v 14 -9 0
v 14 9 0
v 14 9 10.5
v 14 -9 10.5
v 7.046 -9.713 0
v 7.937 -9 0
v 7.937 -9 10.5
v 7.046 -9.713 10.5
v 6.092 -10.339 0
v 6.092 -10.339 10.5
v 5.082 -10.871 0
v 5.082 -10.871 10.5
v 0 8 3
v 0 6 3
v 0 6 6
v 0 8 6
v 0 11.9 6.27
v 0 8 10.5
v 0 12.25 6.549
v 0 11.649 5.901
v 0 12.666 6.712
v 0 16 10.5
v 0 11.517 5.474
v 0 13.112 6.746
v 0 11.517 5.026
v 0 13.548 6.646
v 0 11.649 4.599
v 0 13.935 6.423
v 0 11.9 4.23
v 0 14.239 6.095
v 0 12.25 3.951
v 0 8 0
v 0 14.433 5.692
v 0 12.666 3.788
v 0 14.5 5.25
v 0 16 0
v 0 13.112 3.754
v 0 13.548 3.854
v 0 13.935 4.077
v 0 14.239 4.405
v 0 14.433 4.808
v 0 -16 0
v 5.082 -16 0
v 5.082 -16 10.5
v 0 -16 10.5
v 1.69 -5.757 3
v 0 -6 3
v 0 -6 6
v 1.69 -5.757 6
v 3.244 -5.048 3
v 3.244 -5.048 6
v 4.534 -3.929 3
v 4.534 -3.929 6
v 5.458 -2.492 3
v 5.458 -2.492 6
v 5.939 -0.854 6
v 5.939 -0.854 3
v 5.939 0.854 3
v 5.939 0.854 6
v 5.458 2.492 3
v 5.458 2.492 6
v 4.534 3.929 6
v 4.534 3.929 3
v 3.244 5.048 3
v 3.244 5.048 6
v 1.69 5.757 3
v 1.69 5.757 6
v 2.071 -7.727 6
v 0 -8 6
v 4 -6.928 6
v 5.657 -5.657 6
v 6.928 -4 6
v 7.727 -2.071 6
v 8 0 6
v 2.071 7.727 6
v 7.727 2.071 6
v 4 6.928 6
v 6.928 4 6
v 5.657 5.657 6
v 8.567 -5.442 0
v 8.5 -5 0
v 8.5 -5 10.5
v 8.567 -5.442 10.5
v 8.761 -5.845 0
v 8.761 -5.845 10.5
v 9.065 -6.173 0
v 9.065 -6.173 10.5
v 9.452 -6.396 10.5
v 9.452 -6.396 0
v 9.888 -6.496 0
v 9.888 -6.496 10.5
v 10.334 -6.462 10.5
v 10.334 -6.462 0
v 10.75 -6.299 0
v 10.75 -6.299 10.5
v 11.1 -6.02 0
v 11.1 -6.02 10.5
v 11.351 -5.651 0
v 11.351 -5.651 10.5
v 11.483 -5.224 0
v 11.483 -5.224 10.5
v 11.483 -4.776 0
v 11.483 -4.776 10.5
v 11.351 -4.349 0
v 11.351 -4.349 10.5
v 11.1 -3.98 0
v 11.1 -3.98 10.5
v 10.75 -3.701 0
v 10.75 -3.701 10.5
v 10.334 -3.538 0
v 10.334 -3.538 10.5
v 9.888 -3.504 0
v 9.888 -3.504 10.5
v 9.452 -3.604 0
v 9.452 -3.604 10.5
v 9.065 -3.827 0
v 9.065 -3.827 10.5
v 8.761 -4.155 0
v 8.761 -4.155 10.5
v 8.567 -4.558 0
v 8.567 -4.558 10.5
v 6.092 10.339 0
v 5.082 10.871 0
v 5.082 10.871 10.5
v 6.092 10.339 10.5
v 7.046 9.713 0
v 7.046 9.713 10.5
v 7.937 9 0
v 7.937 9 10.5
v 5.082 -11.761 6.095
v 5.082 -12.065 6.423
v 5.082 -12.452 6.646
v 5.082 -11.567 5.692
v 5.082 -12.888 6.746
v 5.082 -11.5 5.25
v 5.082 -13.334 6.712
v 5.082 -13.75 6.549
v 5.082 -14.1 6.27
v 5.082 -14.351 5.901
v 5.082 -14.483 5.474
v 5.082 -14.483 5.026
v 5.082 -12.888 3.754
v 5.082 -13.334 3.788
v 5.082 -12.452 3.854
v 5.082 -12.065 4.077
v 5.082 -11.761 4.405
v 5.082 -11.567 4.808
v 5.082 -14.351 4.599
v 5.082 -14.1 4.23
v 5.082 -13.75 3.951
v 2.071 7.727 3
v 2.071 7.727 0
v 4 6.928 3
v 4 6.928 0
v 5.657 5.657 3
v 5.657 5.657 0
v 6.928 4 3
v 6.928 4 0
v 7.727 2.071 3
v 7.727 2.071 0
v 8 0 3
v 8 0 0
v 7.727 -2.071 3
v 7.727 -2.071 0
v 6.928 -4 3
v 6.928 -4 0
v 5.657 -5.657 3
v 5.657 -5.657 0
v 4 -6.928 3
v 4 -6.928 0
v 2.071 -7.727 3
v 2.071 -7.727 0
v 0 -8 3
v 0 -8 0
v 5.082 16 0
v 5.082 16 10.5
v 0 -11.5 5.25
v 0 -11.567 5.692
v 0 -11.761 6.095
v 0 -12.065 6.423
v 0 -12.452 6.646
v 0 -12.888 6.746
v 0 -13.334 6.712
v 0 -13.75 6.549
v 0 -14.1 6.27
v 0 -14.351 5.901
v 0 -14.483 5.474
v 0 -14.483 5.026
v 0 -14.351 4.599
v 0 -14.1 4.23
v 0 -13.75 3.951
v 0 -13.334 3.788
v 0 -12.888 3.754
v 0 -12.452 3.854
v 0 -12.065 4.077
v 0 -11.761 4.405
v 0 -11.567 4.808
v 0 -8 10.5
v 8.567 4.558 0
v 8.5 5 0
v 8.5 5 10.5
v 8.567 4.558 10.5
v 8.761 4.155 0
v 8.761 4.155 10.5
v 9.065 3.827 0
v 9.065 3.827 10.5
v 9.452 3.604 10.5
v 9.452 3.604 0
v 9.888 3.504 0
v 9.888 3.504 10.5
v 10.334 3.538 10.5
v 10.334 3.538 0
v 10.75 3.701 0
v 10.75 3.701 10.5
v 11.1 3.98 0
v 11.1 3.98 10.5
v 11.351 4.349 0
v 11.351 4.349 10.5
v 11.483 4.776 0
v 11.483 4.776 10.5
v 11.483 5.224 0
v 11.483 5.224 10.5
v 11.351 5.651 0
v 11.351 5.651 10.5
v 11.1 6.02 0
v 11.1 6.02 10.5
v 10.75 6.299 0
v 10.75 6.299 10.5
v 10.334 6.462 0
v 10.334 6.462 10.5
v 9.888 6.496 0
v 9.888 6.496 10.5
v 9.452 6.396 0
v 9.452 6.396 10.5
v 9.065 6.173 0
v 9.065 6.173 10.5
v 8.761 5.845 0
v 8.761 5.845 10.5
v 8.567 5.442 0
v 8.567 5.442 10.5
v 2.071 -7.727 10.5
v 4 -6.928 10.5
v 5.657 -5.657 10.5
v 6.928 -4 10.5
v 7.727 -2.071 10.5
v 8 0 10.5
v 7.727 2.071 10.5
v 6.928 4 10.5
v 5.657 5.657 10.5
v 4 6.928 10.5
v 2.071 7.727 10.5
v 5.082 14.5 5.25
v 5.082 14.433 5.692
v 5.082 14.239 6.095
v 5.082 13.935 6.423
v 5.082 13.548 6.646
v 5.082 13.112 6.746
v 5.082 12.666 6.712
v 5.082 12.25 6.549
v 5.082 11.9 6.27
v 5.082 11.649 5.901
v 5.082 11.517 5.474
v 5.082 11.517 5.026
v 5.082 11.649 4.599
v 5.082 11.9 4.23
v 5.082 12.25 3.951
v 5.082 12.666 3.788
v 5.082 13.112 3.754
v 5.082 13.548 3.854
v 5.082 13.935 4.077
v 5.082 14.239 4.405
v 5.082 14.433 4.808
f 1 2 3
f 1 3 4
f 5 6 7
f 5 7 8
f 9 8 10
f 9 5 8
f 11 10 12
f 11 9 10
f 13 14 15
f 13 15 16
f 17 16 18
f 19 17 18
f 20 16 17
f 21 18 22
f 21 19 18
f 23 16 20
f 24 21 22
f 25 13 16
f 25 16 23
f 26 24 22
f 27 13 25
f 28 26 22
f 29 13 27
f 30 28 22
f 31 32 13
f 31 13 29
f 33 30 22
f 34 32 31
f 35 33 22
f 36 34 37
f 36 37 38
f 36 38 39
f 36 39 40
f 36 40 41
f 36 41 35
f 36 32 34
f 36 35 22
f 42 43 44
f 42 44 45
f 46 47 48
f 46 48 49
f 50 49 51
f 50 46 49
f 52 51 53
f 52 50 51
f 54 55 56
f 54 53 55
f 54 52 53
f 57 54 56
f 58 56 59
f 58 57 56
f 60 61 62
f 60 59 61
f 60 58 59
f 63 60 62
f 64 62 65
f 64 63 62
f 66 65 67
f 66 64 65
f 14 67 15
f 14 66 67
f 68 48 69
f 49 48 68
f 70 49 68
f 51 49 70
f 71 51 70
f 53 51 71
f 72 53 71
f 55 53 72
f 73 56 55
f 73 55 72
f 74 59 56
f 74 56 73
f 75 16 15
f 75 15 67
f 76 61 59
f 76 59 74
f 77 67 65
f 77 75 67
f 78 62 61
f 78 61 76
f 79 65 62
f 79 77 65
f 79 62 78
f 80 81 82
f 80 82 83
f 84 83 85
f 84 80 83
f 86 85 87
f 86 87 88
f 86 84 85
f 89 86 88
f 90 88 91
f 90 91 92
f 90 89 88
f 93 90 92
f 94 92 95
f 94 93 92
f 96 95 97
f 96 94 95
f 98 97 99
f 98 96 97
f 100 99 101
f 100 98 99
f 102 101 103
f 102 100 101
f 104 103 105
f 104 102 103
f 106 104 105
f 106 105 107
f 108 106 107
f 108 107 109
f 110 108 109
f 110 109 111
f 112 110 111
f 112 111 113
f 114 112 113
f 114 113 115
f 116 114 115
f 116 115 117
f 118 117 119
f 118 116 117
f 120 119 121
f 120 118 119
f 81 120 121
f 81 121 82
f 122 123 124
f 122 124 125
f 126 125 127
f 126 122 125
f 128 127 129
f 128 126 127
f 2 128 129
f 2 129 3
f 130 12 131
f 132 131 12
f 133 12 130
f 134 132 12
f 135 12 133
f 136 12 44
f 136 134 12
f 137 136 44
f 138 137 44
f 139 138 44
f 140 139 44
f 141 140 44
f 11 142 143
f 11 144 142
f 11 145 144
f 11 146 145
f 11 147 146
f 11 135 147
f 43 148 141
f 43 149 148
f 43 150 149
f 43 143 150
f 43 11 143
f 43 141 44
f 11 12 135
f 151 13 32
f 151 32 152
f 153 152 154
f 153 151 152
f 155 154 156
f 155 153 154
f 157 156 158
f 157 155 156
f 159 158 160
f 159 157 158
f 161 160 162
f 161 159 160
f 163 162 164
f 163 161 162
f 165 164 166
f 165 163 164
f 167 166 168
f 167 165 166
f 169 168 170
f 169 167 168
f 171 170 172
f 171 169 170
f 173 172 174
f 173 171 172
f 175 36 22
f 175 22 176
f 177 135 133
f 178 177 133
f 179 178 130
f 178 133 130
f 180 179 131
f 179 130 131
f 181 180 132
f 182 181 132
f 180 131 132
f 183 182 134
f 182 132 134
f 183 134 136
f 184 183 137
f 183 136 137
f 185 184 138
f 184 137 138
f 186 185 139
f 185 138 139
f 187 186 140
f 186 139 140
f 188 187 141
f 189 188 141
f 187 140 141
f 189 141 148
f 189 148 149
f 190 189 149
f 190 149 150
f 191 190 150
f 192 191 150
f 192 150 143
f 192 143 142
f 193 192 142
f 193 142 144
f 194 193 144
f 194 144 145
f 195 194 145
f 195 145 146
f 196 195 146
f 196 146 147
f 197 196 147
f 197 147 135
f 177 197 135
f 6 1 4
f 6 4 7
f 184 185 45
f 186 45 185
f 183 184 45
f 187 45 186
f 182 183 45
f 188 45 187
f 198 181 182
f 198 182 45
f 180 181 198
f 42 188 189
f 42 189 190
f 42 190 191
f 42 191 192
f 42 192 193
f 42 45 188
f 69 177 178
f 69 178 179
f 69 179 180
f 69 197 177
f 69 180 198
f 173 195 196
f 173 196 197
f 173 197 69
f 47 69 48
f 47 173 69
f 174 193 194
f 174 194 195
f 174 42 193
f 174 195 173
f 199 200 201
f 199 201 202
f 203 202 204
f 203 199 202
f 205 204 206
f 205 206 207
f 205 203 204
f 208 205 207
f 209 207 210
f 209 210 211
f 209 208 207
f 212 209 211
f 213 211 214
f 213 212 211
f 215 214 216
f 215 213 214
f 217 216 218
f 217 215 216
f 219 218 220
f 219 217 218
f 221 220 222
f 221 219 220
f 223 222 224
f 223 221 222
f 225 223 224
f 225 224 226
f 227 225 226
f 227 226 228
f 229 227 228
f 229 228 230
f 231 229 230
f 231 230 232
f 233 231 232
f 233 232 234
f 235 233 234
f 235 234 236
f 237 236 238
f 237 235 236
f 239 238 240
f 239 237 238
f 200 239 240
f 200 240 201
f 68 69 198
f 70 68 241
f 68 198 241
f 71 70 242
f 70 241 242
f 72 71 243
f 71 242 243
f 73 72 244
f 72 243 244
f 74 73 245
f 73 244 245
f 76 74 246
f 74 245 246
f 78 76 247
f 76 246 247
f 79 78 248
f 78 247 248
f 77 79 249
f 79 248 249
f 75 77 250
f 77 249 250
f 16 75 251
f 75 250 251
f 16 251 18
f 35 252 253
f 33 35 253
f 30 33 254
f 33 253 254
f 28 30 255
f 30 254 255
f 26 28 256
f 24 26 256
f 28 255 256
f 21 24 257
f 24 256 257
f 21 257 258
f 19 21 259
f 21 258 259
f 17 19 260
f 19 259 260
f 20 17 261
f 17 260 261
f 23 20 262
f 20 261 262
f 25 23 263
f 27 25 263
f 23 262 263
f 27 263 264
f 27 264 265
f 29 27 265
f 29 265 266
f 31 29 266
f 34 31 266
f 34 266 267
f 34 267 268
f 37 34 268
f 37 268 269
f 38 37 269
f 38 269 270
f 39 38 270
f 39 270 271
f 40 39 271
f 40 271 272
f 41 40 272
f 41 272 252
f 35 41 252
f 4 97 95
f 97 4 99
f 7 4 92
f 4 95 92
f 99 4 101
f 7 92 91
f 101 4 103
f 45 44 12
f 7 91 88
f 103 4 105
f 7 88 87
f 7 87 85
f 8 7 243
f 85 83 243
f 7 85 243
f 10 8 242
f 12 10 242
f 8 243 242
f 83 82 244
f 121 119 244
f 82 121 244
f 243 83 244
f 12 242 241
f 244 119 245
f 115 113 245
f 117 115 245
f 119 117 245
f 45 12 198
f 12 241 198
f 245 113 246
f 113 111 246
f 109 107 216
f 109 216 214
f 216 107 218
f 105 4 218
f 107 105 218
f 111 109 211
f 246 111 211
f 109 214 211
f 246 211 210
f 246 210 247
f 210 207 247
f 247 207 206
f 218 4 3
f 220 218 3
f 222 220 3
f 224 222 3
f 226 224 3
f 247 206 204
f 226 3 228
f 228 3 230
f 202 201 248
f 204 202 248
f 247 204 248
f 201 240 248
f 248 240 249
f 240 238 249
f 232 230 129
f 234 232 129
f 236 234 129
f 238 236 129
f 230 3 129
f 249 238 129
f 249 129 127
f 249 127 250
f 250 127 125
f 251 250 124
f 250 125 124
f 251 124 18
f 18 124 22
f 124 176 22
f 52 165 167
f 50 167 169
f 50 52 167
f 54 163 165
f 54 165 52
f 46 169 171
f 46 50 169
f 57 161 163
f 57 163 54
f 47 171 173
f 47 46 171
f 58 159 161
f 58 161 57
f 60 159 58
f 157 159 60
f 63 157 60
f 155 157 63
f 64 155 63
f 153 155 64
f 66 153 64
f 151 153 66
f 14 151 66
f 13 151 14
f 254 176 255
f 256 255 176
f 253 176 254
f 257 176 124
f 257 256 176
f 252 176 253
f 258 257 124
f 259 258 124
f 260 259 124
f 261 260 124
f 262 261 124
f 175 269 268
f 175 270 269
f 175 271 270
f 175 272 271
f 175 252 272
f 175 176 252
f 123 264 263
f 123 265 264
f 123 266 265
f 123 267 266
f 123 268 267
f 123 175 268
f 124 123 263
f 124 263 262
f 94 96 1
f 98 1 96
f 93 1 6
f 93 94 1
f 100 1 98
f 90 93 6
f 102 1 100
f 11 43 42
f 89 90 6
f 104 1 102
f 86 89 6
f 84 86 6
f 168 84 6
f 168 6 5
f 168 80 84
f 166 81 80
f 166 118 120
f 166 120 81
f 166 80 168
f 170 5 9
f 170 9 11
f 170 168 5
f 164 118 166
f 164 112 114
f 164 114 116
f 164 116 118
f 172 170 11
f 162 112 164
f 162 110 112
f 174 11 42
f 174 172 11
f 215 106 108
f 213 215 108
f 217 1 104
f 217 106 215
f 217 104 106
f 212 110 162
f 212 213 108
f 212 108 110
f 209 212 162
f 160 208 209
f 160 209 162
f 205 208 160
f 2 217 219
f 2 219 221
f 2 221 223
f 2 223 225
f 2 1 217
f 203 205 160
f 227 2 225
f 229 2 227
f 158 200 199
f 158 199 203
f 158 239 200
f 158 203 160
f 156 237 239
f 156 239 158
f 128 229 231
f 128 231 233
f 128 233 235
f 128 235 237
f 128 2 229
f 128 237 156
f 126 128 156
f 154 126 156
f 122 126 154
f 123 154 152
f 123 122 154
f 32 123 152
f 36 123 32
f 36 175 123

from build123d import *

# Parameters (mm, degrees)
SKETCH2_R           = 1.5
BOSS_EXTRUDE1_DEPTH = 10.5
SKETCH3_R           = 8
CUT_EXTRUDE1_DEPTH  = 4.5
SKETCH5_R           = 1.5
CUT_EXTRUDE3_DEPTH  = 22.113593143
CUT_EXTRUDE2_START  = -3
SKETCH4_R           = 8
CUT_EXTRUDE2_DEPTH  = 3


with BuildPart() as part:
    # Sketch2 → Boss-Extrude1 (new body)
    with BuildSketch(Plane.XY):
        with BuildLine():
            Line((7.937253933, 9), (14, 9))
            Line((14, 9), (14, -9))
            Line((14, -9), (7.937253933, -9))
            ThreePointArc((7.937253933, -9), (6.576406328, -10.037473776), (5.081826677, -10.870834265))
            Line((5.081826677, -10.870834265), (5.081826677, -16))
            Line((5.081826677, -16), (0, -16))
            Line((0, -16), (0, -9))
            Line((0, -9), (0, -6))
            ThreePointArc((0, -6), (6, 0), (0, 6))
            Line((0, 6), (0, 9))
            Line((0, 9), (0, 16))
            Line((0, 16), (5.081826677, 16))
            Line((5.081826677, 16), (5.081826677, 10.870834265))
            ThreePointArc((5.081826677, 10.870834265), (6.576406328, 10.037473776), (7.937253933, 9))
        make_face()
        with Locations((10, 5)):
            Circle(SKETCH2_R, mode=Mode.SUBTRACT)
        with Locations((10, -5)):
            Circle(SKETCH2_R, mode=Mode.SUBTRACT)
    extrude(amount=BOSS_EXTRUDE1_DEPTH)

    # Sketch3 → Cut-Extrude1 (cut)
    with BuildSketch(Plane.XY.offset(10.5)):
        Circle(SKETCH3_R)
    extrude(amount=-CUT_EXTRUDE1_DEPTH, mode=Mode.SUBTRACT)

    # Sketch5 → Cut-Extrude3 (cut, through all)
    with BuildSketch(Plane(origin=(5.081826677, 0, 0), x_dir=(0, 0, -1), z_dir=(1, 0, 0))):
        with Locations((-5.25, 13)):
            Circle(SKETCH5_R)
        with Locations((-5.25, -13)):
            Circle(SKETCH5_R)
    extrude(amount=-CUT_EXTRUDE3_DEPTH, mode=Mode.SUBTRACT)

    # Sketch4 → Cut-Extrude2 (cut)
    with BuildSketch(Plane(origin=(0, 0, 0), x_dir=(-1, 0, 0), z_dir=(0, 0, -1)).offset(CUT_EXTRUDE2_START)):
        Circle(SKETCH4_R)
    extrude(amount=CUT_EXTRUDE2_DEPTH, mode=Mode.SUBTRACT)


solid = part.part
